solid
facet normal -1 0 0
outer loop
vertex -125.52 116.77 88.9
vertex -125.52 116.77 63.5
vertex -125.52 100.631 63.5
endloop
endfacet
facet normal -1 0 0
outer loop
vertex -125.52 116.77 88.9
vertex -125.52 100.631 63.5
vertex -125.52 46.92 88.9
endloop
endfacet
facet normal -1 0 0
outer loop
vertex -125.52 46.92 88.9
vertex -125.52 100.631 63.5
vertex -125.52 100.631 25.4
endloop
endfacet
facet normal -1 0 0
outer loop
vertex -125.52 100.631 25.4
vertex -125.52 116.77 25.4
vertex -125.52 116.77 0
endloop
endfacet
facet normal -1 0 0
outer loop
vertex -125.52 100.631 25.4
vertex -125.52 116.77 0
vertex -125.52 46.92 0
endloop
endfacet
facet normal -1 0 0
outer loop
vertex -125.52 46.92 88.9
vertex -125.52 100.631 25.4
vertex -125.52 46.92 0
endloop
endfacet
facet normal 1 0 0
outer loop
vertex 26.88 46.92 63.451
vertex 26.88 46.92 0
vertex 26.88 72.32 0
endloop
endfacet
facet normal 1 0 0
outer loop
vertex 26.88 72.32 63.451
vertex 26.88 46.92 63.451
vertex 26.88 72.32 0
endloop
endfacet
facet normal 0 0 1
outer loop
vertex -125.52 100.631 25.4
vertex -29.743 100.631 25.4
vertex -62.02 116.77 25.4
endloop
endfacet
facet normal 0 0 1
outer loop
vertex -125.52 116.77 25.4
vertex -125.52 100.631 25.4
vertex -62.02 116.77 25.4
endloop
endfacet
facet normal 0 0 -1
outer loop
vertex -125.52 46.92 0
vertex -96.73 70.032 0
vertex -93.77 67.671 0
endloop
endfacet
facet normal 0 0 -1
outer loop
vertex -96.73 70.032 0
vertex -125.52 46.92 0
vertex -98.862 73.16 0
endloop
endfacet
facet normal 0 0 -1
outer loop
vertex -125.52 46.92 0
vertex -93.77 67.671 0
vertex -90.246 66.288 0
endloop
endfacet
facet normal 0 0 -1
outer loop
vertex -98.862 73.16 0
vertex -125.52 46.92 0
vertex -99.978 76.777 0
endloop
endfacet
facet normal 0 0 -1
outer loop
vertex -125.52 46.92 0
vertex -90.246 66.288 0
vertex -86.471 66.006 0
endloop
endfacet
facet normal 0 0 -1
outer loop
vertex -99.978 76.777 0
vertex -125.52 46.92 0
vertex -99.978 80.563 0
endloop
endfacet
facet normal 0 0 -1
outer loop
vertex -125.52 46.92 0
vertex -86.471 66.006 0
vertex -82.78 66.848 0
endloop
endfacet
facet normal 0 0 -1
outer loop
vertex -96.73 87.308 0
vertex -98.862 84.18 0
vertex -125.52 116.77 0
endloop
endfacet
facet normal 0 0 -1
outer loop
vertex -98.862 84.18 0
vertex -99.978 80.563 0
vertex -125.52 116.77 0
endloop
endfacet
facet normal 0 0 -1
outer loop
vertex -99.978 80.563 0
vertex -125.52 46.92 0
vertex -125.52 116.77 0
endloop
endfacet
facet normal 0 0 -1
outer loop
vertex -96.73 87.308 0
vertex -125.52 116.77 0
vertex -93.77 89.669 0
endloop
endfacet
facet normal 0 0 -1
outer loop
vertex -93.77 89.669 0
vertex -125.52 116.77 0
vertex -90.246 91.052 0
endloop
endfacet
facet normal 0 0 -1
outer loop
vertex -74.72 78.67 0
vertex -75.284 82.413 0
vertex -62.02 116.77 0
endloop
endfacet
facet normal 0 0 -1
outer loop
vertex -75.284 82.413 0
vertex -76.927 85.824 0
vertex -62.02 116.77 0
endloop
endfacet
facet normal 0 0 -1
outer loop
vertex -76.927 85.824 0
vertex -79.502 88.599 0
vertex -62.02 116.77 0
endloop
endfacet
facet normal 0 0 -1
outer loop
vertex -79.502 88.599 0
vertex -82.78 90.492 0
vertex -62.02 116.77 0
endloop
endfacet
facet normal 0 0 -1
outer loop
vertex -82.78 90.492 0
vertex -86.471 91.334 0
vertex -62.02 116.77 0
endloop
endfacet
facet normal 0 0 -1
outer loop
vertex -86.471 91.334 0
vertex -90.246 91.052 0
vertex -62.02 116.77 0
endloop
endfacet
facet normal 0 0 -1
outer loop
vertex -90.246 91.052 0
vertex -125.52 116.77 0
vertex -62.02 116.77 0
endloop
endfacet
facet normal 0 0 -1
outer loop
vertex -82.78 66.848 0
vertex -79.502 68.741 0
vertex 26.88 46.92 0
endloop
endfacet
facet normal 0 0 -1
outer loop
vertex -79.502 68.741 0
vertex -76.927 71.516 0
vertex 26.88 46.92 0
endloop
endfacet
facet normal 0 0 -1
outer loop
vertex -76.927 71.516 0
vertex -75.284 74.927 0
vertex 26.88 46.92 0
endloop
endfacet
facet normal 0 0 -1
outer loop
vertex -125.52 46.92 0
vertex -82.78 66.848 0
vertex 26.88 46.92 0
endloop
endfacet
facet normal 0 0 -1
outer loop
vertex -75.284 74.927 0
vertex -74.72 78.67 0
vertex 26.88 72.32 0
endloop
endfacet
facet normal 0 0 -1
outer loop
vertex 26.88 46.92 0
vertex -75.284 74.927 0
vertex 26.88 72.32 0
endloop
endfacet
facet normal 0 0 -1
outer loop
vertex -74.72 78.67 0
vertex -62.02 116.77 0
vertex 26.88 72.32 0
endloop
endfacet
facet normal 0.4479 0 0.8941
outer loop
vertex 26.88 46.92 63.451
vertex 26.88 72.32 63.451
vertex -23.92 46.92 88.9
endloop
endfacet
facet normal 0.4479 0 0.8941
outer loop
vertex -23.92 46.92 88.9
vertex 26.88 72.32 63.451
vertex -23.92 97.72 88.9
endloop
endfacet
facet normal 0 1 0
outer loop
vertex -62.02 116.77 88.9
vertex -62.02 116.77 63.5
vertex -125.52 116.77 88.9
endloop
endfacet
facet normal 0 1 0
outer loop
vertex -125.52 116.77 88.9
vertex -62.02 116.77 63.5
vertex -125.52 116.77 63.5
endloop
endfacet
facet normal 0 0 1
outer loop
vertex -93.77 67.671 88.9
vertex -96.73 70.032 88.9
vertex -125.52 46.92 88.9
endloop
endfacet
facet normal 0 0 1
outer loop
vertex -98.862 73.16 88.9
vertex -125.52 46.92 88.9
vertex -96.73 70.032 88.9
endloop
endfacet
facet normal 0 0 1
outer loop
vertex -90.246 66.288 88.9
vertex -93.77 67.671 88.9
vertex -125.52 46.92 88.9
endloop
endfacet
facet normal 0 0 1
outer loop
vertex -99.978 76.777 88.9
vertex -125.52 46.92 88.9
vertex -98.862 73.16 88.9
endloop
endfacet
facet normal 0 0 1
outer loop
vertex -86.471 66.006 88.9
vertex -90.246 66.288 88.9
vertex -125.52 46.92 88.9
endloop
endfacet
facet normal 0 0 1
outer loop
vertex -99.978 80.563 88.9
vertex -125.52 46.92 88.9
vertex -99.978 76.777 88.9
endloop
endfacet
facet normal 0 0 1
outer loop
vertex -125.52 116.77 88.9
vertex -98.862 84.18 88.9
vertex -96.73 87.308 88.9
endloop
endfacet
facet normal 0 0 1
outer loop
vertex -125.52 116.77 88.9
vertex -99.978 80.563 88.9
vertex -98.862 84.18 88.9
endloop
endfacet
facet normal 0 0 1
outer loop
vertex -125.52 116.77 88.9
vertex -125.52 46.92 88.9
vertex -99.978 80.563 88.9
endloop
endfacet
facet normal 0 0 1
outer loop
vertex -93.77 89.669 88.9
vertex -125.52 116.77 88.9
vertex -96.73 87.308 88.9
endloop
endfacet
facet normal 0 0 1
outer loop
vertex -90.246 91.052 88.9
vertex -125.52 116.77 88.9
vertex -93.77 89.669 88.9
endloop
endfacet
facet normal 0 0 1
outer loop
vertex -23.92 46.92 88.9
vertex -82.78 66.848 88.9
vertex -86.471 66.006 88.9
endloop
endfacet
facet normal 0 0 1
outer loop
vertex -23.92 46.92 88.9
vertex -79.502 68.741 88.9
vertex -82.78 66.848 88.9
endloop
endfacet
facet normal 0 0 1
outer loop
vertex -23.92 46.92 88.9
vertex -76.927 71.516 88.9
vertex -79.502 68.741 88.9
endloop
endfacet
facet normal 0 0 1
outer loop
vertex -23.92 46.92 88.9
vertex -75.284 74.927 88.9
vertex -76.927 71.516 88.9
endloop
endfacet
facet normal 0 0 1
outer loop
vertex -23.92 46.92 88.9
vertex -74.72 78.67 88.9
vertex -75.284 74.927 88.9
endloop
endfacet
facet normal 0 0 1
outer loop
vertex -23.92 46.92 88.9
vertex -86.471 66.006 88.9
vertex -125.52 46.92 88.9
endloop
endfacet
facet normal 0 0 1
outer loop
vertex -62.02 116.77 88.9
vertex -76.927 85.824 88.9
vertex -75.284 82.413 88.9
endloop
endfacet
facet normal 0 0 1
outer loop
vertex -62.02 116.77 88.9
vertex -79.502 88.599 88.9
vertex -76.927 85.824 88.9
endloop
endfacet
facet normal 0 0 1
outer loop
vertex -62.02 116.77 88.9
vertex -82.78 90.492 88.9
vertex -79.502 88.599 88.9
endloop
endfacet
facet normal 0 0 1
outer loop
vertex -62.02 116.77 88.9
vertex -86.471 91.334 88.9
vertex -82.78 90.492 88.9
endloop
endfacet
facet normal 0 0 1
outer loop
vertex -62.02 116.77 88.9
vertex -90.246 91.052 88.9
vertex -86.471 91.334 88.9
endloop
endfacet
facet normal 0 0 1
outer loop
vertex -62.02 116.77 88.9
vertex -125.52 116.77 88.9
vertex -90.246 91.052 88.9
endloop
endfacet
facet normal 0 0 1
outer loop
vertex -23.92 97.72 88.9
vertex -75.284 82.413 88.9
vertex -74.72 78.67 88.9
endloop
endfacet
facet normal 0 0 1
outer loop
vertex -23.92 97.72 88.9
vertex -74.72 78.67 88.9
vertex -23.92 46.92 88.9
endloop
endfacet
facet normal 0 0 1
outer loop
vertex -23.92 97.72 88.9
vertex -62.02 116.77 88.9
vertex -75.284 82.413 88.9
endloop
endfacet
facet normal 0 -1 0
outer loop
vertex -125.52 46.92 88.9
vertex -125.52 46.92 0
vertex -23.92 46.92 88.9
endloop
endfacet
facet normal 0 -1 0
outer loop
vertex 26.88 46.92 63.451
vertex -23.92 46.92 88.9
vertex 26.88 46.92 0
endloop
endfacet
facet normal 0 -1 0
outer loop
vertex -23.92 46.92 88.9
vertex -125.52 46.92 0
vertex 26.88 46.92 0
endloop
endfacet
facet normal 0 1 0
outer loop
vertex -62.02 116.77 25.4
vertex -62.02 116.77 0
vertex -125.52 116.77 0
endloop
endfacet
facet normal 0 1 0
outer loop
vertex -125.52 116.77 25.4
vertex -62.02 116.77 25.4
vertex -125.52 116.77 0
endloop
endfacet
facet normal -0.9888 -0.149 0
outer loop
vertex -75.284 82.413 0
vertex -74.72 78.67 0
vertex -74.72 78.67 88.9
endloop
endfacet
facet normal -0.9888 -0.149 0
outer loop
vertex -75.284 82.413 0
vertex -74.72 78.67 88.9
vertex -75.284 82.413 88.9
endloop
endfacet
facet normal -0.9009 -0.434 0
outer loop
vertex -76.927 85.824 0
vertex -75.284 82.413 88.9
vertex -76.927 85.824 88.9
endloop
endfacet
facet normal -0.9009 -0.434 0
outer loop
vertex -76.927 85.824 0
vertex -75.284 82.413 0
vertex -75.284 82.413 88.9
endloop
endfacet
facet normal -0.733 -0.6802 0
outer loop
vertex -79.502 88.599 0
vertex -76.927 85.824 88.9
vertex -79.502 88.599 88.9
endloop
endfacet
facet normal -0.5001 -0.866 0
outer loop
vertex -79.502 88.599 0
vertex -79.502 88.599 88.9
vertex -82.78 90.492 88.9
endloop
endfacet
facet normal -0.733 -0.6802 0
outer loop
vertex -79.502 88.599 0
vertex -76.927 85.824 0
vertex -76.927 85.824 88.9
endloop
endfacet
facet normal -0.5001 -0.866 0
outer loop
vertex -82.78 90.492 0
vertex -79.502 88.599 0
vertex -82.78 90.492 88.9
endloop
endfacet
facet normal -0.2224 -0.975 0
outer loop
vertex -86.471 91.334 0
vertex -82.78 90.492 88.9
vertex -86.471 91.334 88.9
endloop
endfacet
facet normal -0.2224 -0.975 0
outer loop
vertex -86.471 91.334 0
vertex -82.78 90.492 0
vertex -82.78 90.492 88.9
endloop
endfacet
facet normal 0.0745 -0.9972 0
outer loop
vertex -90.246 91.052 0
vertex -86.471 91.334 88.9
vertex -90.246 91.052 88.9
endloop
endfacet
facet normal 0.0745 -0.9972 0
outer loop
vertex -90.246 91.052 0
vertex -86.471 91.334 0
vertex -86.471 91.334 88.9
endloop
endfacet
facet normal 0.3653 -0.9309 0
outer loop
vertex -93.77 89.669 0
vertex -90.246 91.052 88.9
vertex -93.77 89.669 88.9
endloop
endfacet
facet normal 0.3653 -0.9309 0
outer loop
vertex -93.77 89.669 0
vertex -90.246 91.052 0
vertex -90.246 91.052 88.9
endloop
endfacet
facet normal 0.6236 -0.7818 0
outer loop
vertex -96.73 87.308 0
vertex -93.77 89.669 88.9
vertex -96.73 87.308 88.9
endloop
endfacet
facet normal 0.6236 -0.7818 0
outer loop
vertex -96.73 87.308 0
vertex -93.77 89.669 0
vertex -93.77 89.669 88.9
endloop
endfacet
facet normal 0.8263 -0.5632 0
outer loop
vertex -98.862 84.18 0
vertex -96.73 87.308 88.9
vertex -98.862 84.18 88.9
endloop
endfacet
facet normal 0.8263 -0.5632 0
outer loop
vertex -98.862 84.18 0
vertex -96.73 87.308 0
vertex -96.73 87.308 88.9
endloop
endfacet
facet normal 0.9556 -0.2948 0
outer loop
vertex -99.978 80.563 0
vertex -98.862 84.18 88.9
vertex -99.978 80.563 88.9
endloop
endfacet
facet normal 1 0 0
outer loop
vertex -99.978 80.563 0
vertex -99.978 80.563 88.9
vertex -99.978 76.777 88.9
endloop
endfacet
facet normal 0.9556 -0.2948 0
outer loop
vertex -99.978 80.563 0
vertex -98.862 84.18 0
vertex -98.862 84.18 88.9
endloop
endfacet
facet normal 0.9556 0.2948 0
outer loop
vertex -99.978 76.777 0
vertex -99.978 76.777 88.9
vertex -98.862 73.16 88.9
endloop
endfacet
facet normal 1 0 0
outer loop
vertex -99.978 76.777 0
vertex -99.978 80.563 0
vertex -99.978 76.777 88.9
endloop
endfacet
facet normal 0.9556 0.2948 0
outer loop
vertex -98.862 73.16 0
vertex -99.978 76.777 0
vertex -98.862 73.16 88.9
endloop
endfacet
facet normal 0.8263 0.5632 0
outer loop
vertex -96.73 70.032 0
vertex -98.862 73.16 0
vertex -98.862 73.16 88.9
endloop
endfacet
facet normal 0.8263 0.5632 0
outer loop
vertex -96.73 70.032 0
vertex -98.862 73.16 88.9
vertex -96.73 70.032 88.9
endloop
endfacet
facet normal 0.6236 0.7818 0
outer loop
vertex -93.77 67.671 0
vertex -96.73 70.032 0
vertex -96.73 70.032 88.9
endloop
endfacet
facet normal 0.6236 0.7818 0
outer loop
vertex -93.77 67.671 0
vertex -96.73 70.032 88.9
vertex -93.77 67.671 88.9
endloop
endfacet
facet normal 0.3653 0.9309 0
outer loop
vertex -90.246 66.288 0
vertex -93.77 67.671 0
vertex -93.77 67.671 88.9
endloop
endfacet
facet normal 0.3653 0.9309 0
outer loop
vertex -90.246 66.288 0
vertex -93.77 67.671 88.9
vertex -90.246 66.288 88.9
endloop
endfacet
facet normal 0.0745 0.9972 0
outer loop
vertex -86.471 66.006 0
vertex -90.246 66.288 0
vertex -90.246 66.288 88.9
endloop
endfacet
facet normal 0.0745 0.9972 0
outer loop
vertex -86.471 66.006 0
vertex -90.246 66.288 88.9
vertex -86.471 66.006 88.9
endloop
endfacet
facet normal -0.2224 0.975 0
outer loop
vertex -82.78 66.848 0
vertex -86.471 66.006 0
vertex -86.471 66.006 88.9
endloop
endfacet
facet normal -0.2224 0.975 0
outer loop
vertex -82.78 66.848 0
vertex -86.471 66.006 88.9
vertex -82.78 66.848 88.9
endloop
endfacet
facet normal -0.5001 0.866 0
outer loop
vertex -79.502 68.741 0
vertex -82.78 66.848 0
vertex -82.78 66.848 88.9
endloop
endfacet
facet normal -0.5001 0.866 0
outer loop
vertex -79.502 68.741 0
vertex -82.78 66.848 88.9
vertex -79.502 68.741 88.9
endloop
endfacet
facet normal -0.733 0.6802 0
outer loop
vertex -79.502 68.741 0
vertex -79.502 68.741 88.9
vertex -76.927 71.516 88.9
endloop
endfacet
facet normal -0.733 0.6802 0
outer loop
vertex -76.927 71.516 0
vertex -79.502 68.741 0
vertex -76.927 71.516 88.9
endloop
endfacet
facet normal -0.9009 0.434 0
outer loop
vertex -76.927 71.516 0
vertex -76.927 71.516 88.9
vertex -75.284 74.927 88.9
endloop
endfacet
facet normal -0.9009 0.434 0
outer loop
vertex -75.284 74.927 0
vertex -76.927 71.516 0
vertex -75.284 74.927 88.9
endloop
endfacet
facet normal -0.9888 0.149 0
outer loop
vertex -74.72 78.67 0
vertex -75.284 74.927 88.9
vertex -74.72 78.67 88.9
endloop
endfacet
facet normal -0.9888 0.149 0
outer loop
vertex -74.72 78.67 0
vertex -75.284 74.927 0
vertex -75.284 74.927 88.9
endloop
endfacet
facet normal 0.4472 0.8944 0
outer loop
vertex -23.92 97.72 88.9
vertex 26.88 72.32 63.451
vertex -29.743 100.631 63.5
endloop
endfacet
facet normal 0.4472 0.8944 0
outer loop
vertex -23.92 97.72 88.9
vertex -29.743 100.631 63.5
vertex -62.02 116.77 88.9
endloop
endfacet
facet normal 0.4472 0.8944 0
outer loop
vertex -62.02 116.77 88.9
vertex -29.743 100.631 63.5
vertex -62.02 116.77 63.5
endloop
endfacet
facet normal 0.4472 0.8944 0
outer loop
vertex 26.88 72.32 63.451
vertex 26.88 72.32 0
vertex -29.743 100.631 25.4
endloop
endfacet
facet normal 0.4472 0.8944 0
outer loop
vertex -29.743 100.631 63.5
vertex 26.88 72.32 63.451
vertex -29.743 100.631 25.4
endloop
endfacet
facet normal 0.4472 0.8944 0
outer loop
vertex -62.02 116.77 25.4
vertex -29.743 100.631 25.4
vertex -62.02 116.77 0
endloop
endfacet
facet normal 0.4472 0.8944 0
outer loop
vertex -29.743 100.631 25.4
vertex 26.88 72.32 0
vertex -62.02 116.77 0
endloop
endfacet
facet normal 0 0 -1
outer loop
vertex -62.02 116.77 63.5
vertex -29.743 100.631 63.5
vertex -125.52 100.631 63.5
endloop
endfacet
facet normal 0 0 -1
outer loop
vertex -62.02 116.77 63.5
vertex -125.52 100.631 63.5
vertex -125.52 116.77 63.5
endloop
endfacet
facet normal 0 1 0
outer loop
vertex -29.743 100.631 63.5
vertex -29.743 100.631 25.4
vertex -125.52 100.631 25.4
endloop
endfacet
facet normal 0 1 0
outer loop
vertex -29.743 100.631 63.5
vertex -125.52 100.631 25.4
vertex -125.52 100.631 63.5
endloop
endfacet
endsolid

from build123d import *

# Parameters (mm, degrees)
SKETCH1_R           = 12.7
BOSS_EXTRUDE1_DEPTH = 88.9
CUT_EXTRUDE1_DEPTH  = 169.930467649
SKETCH3_W           = 38.1
SKETCH3_H           = 16.138601809
CUT_EXTRUDE2_DEPTH  = 254


with BuildPart() as part:
    # Sketch1 → Boss-Extrude1 (new body)
    with BuildSketch(Plane.XY):
        Polygon((-125.52, 46.92), (26.88, 46.92), (26.88, 72.32), (-62.02, 116.77), (-125.52, 116.77), align=None)
        with Locations((-87.42, 78.67)):
            Circle(SKETCH1_R, mode=Mode.SUBTRACT)
    extrude(amount=BOSS_EXTRUDE1_DEPTH)

    # Sketch2 → Cut-Extrude1 (cut, through all)
    with BuildSketch(Plane(origin=(0, 116.77, 0), x_dir=(1, 0, 0), z_dir=(0, 1, 0))):
        Polygon((26.88, -63.451430224), (-23.92, -88.9), (26.88, -88.9), align=None)
    extrude(amount=-CUT_EXTRUDE1_DEPTH, mode=Mode.SUBTRACT)

    # Sketch3 → Cut-Extrude2 (cut)
    with BuildSketch(Plane.ZY.offset(125.52)):
        with Locations((44.45, 108.700699095)):
            Rectangle(SKETCH3_W, SKETCH3_H)
    extrude(amount=-CUT_EXTRUDE2_DEPTH, mode=Mode.SUBTRACT)


solid = part.part
